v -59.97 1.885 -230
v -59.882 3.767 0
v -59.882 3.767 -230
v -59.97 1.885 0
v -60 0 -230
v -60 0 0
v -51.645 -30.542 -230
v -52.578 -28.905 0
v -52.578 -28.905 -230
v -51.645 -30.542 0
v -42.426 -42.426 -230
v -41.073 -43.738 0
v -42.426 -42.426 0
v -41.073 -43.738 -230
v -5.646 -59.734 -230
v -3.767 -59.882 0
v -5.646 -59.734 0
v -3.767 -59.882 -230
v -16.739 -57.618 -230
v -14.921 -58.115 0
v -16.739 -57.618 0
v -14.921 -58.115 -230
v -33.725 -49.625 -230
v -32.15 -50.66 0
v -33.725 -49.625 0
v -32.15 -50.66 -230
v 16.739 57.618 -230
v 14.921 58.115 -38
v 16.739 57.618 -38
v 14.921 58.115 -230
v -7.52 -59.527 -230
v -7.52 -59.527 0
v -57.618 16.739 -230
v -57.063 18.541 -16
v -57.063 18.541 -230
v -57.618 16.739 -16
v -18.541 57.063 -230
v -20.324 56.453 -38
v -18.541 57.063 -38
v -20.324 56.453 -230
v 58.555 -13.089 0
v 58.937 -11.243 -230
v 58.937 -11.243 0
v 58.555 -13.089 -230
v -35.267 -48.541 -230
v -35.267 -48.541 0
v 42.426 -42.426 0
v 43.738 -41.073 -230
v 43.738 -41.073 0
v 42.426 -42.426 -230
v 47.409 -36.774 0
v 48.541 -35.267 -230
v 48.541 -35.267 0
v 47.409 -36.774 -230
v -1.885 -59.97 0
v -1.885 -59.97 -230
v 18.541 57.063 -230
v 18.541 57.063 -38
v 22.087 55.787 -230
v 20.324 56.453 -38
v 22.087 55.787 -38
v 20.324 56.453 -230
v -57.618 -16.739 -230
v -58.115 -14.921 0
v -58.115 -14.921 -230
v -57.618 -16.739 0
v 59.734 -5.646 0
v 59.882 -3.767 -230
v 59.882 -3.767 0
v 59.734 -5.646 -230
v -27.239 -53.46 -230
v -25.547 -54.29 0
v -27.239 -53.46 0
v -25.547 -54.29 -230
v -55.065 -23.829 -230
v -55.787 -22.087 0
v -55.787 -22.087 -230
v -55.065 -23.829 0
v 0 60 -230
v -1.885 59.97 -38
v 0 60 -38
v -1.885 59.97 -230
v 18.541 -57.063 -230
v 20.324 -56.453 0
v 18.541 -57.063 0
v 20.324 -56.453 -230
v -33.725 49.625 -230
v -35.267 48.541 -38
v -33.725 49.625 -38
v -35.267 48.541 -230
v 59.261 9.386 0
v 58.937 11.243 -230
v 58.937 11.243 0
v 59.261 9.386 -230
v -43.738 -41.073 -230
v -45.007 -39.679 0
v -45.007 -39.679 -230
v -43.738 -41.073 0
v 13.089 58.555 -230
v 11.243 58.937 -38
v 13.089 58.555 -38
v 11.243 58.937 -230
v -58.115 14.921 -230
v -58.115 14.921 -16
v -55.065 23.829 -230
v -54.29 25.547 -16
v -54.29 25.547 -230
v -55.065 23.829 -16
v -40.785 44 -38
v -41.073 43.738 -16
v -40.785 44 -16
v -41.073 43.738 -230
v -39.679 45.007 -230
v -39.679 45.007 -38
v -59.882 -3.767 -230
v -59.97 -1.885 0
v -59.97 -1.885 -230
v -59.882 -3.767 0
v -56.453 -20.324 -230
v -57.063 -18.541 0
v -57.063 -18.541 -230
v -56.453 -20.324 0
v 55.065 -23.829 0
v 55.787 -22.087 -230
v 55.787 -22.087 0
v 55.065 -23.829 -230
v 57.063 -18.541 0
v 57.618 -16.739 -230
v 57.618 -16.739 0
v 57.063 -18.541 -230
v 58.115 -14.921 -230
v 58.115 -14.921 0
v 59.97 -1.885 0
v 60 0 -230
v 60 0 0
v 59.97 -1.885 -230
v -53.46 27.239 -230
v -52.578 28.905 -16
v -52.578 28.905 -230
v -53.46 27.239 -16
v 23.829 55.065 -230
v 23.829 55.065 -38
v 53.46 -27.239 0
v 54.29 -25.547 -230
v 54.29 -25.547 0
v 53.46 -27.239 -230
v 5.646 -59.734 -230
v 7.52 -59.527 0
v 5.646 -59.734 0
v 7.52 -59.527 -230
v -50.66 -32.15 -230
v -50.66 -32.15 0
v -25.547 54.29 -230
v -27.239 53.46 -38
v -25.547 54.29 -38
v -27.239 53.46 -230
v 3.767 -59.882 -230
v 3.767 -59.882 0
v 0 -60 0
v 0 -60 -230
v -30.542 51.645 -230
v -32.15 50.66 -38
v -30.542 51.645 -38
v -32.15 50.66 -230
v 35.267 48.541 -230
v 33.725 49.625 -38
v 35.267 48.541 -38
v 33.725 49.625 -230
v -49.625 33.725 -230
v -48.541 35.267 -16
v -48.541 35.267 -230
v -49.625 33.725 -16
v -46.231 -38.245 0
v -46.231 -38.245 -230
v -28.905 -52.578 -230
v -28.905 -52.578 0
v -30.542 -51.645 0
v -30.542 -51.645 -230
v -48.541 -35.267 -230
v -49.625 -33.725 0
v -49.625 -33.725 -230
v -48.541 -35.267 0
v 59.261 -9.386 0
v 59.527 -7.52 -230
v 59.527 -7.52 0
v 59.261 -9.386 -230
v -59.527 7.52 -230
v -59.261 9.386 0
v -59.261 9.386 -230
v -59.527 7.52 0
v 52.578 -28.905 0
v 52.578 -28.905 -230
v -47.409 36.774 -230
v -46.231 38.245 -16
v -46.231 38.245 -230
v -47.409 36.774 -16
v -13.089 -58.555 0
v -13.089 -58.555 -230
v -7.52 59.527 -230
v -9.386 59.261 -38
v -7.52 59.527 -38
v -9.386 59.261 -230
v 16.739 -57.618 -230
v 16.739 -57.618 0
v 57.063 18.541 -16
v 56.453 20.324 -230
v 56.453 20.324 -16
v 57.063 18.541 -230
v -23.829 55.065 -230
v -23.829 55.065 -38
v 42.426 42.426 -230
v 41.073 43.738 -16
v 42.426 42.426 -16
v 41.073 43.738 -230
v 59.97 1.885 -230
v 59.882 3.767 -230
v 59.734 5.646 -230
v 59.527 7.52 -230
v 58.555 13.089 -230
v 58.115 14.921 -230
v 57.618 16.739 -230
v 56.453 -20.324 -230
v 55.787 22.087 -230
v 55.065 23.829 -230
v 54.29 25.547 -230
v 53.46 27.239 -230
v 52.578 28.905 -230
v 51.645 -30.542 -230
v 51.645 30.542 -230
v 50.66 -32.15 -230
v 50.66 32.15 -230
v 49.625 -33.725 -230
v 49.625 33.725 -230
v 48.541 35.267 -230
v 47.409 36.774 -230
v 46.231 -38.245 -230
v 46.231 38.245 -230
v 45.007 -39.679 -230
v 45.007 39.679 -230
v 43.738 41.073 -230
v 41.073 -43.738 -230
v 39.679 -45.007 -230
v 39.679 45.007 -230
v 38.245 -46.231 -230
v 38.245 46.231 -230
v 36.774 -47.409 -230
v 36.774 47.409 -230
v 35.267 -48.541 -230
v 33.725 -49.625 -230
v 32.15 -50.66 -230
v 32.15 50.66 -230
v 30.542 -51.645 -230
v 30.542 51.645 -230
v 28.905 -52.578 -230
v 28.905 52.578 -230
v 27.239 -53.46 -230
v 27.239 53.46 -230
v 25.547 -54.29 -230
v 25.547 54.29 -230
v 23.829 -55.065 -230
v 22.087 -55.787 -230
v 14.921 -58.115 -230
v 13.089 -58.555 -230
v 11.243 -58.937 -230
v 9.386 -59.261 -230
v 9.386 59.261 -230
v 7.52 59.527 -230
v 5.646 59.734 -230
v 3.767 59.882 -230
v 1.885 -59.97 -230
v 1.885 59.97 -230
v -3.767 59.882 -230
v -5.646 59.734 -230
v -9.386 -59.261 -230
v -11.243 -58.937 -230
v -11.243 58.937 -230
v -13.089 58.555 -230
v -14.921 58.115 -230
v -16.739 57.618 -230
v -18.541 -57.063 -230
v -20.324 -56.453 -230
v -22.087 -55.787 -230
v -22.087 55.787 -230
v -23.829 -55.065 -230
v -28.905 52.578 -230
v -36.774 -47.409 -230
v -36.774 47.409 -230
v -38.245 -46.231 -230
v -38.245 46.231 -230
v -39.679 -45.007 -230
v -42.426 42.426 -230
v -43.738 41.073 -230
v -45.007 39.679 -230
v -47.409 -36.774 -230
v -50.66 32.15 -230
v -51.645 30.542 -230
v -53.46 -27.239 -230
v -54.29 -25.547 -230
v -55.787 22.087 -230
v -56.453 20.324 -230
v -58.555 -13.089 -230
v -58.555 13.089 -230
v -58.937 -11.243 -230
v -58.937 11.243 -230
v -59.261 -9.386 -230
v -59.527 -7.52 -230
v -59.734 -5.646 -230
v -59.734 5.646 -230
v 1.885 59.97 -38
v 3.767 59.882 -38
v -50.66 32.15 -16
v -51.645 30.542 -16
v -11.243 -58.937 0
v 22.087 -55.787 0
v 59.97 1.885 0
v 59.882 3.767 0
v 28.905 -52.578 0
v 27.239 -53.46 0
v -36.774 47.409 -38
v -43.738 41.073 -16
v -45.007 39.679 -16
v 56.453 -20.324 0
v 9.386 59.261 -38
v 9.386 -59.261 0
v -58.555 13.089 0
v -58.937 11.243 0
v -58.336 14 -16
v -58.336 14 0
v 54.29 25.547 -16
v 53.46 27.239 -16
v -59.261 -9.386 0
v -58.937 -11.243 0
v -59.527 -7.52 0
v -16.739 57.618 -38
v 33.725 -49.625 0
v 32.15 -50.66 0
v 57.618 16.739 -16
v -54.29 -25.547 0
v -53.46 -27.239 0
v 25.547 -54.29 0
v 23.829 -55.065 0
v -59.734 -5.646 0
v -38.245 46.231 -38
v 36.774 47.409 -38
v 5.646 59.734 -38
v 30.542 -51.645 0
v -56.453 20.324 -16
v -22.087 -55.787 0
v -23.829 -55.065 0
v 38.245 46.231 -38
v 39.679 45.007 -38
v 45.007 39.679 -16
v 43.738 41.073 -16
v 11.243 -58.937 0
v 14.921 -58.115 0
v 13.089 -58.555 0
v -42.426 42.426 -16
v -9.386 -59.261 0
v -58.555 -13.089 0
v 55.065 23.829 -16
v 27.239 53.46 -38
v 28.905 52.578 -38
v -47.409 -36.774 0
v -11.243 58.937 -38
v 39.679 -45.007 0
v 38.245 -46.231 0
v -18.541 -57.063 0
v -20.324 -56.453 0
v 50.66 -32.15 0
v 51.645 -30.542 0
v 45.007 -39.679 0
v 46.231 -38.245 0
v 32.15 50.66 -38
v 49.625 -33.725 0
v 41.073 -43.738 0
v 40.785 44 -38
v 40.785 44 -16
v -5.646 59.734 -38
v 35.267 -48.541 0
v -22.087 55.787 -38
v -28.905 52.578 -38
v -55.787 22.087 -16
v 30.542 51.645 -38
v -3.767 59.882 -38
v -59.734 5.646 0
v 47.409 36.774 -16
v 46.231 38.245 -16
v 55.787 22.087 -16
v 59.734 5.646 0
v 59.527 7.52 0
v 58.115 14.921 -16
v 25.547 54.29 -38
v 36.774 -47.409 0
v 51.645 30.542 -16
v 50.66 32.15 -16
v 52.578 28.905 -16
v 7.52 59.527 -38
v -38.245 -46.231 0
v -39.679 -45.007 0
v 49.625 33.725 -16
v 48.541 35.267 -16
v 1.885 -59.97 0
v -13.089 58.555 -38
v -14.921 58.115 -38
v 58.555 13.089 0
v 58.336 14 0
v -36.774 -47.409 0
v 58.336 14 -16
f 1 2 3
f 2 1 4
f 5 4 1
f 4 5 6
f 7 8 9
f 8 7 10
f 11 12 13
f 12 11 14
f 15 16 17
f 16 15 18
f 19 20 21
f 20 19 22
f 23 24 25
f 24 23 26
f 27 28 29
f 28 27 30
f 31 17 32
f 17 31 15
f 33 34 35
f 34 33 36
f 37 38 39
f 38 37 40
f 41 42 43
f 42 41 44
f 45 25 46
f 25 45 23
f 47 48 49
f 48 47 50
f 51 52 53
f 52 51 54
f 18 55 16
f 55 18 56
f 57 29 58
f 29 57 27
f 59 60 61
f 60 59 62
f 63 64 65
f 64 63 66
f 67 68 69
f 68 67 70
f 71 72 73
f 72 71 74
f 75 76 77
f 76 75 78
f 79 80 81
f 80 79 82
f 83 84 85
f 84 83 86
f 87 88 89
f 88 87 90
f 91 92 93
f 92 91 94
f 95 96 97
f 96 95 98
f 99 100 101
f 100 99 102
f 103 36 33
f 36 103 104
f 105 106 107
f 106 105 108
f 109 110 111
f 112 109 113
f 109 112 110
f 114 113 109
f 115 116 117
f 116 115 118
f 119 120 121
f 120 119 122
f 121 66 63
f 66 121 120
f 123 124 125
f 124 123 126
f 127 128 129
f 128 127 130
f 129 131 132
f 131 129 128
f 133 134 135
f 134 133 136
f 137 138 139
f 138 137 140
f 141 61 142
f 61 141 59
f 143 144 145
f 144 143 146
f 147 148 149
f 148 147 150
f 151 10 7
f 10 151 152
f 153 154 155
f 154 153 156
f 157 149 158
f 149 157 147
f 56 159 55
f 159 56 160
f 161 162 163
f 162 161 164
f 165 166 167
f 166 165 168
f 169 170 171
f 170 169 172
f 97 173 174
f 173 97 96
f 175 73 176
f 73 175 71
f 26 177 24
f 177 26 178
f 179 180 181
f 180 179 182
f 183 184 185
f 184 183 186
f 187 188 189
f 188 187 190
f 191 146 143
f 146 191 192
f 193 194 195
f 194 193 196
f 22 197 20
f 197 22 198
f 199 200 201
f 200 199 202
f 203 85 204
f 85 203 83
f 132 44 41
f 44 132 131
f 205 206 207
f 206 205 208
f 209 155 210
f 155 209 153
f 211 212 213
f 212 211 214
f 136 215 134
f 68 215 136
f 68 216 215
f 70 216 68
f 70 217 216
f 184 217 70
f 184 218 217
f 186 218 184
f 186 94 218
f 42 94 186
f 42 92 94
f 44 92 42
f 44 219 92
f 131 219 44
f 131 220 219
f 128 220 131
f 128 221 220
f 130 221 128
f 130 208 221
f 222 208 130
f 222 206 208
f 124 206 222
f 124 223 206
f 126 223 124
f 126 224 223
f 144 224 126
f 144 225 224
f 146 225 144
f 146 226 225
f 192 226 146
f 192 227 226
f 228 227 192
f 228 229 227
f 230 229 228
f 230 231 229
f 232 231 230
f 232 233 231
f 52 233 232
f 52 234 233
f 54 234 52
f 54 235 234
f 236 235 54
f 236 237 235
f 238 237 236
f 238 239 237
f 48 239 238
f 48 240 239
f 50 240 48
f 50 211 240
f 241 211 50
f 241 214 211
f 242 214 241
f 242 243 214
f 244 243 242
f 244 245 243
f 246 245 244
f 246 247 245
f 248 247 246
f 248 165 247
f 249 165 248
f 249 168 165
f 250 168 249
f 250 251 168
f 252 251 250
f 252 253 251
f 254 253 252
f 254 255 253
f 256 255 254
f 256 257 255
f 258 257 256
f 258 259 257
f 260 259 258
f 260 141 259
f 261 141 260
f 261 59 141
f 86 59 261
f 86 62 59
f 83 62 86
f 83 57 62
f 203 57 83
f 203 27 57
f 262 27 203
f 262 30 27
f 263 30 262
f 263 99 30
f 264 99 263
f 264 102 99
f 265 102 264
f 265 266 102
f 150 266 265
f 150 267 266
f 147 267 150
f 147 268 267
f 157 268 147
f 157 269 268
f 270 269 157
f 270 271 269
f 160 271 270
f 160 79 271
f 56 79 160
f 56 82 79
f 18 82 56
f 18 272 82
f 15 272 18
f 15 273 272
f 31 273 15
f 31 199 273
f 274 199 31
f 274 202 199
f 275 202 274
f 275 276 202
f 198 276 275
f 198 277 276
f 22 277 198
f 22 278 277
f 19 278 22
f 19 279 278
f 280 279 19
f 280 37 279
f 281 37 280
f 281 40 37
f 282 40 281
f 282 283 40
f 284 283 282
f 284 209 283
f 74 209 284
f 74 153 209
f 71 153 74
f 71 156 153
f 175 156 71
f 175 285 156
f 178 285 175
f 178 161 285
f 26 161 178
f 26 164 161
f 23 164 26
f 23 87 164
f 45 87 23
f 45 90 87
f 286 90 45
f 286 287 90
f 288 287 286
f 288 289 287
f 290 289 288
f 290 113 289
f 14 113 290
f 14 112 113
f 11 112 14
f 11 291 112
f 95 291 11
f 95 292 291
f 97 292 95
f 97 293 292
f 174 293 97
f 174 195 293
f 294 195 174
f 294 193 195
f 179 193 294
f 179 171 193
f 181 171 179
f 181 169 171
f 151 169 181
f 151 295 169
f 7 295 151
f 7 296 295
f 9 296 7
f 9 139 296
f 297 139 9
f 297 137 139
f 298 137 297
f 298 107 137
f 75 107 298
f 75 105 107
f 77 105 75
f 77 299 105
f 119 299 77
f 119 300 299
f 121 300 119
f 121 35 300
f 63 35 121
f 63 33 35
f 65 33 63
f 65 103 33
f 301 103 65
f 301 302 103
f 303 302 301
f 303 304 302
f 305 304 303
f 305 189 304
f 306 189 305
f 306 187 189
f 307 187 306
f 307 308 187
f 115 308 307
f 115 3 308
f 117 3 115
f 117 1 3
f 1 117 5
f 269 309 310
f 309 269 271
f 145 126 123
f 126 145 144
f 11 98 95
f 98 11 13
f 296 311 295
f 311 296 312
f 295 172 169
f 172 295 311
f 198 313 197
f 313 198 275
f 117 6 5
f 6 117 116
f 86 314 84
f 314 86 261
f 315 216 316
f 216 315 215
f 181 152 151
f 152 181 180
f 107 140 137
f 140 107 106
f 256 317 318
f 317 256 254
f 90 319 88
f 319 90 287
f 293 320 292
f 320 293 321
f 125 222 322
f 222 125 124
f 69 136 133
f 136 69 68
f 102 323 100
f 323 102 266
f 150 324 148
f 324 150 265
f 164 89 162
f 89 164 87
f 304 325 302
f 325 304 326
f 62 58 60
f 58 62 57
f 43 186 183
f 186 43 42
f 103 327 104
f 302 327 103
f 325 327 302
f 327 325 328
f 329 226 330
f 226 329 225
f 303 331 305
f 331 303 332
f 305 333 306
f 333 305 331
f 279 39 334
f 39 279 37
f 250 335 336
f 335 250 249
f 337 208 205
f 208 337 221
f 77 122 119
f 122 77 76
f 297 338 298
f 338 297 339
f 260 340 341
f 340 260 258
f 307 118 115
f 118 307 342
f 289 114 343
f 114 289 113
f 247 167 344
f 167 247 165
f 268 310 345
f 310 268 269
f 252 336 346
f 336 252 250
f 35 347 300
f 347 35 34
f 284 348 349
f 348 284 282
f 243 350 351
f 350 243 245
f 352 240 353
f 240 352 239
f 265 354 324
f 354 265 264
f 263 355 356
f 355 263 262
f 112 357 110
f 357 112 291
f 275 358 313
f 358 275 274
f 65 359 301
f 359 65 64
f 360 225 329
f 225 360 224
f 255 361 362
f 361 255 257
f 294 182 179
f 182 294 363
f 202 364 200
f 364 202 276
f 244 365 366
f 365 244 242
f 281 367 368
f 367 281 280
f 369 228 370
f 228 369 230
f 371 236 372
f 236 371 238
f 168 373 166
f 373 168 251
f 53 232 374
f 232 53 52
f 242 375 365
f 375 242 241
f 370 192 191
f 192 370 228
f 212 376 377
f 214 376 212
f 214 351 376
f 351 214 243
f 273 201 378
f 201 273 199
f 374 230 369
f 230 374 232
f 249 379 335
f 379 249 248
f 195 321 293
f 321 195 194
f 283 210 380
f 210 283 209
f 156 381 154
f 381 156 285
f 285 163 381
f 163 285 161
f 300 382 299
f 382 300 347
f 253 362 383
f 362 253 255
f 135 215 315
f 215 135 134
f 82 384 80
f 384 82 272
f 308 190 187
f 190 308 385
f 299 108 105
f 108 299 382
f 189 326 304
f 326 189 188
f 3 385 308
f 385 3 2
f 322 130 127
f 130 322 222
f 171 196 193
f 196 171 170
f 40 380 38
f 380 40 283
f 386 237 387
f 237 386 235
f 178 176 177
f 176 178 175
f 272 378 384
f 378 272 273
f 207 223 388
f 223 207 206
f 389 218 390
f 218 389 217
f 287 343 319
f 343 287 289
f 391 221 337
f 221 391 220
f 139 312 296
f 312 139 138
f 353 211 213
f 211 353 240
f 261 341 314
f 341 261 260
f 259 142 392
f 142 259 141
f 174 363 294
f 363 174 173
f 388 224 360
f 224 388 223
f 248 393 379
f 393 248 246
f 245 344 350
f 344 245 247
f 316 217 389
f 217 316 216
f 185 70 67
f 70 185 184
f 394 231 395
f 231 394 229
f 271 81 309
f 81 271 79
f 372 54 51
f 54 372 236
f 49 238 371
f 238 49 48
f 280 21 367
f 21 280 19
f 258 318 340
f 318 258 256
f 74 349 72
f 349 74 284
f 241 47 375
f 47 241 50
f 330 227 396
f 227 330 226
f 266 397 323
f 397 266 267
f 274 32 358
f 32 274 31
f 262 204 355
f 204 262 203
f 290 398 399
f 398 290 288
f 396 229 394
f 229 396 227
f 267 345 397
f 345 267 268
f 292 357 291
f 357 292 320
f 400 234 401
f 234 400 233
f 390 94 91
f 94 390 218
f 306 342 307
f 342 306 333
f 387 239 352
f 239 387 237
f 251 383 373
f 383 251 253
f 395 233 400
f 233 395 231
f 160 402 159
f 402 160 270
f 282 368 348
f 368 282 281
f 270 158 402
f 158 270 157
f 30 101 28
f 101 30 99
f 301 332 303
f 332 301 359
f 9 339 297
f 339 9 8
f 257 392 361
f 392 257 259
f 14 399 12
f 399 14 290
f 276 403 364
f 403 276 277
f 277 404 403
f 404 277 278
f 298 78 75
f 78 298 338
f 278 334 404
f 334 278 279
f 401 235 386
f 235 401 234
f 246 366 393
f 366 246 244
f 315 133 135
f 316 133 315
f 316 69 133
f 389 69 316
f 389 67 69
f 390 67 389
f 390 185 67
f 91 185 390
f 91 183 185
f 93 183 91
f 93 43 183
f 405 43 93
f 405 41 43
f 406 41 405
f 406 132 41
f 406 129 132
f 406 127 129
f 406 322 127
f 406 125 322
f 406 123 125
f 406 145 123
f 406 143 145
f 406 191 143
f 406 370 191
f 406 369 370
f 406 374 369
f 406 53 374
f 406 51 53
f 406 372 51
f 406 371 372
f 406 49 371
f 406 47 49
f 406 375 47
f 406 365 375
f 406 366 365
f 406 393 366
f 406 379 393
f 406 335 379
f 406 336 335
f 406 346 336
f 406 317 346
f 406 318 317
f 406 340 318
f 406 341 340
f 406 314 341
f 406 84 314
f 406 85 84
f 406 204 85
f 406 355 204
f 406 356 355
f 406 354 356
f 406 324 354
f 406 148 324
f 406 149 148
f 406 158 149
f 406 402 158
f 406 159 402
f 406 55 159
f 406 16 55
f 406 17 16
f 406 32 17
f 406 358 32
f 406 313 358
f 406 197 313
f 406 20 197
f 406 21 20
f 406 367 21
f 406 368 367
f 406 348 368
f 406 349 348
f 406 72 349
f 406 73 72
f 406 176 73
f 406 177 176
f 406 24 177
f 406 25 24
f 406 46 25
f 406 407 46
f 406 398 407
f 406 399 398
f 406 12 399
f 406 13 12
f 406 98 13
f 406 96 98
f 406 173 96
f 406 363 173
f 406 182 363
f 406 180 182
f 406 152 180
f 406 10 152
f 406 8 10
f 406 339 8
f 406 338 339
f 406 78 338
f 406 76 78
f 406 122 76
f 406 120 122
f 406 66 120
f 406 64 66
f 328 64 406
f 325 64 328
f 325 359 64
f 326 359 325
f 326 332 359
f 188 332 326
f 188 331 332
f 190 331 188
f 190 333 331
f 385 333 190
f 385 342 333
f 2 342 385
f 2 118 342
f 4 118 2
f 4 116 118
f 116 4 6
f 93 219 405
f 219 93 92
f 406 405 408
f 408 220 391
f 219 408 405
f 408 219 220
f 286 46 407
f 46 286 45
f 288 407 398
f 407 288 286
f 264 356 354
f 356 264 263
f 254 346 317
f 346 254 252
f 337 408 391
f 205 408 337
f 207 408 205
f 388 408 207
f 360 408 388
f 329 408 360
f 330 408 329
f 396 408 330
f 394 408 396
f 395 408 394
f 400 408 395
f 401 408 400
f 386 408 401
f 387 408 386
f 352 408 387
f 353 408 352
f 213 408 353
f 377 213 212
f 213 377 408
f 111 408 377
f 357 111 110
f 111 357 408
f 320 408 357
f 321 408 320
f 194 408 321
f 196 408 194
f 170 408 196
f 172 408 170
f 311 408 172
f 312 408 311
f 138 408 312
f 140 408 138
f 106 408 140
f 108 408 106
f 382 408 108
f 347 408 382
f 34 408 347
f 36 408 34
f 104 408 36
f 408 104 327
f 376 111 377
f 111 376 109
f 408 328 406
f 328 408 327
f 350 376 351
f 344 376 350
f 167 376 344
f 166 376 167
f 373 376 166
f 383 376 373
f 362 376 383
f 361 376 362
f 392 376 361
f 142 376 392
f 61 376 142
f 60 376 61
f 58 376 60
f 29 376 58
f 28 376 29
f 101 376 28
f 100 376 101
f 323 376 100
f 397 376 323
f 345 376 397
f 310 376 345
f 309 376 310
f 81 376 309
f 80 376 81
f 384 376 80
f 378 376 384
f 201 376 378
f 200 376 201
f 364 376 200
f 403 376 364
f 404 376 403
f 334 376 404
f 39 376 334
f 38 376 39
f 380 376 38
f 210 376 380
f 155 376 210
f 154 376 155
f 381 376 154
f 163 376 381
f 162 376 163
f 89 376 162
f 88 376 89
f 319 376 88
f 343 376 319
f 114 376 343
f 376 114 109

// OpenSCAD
$fn=200;
d=120;
rotate([0,180,0])
difference() {
    cylinder(d=120,h=230);
    translate([-d/2,d/2-30-16,0])
    cube([d,30,16]);
    translate([-d/2,d/2-16,0])
    #cube([d,16,38]);
}
